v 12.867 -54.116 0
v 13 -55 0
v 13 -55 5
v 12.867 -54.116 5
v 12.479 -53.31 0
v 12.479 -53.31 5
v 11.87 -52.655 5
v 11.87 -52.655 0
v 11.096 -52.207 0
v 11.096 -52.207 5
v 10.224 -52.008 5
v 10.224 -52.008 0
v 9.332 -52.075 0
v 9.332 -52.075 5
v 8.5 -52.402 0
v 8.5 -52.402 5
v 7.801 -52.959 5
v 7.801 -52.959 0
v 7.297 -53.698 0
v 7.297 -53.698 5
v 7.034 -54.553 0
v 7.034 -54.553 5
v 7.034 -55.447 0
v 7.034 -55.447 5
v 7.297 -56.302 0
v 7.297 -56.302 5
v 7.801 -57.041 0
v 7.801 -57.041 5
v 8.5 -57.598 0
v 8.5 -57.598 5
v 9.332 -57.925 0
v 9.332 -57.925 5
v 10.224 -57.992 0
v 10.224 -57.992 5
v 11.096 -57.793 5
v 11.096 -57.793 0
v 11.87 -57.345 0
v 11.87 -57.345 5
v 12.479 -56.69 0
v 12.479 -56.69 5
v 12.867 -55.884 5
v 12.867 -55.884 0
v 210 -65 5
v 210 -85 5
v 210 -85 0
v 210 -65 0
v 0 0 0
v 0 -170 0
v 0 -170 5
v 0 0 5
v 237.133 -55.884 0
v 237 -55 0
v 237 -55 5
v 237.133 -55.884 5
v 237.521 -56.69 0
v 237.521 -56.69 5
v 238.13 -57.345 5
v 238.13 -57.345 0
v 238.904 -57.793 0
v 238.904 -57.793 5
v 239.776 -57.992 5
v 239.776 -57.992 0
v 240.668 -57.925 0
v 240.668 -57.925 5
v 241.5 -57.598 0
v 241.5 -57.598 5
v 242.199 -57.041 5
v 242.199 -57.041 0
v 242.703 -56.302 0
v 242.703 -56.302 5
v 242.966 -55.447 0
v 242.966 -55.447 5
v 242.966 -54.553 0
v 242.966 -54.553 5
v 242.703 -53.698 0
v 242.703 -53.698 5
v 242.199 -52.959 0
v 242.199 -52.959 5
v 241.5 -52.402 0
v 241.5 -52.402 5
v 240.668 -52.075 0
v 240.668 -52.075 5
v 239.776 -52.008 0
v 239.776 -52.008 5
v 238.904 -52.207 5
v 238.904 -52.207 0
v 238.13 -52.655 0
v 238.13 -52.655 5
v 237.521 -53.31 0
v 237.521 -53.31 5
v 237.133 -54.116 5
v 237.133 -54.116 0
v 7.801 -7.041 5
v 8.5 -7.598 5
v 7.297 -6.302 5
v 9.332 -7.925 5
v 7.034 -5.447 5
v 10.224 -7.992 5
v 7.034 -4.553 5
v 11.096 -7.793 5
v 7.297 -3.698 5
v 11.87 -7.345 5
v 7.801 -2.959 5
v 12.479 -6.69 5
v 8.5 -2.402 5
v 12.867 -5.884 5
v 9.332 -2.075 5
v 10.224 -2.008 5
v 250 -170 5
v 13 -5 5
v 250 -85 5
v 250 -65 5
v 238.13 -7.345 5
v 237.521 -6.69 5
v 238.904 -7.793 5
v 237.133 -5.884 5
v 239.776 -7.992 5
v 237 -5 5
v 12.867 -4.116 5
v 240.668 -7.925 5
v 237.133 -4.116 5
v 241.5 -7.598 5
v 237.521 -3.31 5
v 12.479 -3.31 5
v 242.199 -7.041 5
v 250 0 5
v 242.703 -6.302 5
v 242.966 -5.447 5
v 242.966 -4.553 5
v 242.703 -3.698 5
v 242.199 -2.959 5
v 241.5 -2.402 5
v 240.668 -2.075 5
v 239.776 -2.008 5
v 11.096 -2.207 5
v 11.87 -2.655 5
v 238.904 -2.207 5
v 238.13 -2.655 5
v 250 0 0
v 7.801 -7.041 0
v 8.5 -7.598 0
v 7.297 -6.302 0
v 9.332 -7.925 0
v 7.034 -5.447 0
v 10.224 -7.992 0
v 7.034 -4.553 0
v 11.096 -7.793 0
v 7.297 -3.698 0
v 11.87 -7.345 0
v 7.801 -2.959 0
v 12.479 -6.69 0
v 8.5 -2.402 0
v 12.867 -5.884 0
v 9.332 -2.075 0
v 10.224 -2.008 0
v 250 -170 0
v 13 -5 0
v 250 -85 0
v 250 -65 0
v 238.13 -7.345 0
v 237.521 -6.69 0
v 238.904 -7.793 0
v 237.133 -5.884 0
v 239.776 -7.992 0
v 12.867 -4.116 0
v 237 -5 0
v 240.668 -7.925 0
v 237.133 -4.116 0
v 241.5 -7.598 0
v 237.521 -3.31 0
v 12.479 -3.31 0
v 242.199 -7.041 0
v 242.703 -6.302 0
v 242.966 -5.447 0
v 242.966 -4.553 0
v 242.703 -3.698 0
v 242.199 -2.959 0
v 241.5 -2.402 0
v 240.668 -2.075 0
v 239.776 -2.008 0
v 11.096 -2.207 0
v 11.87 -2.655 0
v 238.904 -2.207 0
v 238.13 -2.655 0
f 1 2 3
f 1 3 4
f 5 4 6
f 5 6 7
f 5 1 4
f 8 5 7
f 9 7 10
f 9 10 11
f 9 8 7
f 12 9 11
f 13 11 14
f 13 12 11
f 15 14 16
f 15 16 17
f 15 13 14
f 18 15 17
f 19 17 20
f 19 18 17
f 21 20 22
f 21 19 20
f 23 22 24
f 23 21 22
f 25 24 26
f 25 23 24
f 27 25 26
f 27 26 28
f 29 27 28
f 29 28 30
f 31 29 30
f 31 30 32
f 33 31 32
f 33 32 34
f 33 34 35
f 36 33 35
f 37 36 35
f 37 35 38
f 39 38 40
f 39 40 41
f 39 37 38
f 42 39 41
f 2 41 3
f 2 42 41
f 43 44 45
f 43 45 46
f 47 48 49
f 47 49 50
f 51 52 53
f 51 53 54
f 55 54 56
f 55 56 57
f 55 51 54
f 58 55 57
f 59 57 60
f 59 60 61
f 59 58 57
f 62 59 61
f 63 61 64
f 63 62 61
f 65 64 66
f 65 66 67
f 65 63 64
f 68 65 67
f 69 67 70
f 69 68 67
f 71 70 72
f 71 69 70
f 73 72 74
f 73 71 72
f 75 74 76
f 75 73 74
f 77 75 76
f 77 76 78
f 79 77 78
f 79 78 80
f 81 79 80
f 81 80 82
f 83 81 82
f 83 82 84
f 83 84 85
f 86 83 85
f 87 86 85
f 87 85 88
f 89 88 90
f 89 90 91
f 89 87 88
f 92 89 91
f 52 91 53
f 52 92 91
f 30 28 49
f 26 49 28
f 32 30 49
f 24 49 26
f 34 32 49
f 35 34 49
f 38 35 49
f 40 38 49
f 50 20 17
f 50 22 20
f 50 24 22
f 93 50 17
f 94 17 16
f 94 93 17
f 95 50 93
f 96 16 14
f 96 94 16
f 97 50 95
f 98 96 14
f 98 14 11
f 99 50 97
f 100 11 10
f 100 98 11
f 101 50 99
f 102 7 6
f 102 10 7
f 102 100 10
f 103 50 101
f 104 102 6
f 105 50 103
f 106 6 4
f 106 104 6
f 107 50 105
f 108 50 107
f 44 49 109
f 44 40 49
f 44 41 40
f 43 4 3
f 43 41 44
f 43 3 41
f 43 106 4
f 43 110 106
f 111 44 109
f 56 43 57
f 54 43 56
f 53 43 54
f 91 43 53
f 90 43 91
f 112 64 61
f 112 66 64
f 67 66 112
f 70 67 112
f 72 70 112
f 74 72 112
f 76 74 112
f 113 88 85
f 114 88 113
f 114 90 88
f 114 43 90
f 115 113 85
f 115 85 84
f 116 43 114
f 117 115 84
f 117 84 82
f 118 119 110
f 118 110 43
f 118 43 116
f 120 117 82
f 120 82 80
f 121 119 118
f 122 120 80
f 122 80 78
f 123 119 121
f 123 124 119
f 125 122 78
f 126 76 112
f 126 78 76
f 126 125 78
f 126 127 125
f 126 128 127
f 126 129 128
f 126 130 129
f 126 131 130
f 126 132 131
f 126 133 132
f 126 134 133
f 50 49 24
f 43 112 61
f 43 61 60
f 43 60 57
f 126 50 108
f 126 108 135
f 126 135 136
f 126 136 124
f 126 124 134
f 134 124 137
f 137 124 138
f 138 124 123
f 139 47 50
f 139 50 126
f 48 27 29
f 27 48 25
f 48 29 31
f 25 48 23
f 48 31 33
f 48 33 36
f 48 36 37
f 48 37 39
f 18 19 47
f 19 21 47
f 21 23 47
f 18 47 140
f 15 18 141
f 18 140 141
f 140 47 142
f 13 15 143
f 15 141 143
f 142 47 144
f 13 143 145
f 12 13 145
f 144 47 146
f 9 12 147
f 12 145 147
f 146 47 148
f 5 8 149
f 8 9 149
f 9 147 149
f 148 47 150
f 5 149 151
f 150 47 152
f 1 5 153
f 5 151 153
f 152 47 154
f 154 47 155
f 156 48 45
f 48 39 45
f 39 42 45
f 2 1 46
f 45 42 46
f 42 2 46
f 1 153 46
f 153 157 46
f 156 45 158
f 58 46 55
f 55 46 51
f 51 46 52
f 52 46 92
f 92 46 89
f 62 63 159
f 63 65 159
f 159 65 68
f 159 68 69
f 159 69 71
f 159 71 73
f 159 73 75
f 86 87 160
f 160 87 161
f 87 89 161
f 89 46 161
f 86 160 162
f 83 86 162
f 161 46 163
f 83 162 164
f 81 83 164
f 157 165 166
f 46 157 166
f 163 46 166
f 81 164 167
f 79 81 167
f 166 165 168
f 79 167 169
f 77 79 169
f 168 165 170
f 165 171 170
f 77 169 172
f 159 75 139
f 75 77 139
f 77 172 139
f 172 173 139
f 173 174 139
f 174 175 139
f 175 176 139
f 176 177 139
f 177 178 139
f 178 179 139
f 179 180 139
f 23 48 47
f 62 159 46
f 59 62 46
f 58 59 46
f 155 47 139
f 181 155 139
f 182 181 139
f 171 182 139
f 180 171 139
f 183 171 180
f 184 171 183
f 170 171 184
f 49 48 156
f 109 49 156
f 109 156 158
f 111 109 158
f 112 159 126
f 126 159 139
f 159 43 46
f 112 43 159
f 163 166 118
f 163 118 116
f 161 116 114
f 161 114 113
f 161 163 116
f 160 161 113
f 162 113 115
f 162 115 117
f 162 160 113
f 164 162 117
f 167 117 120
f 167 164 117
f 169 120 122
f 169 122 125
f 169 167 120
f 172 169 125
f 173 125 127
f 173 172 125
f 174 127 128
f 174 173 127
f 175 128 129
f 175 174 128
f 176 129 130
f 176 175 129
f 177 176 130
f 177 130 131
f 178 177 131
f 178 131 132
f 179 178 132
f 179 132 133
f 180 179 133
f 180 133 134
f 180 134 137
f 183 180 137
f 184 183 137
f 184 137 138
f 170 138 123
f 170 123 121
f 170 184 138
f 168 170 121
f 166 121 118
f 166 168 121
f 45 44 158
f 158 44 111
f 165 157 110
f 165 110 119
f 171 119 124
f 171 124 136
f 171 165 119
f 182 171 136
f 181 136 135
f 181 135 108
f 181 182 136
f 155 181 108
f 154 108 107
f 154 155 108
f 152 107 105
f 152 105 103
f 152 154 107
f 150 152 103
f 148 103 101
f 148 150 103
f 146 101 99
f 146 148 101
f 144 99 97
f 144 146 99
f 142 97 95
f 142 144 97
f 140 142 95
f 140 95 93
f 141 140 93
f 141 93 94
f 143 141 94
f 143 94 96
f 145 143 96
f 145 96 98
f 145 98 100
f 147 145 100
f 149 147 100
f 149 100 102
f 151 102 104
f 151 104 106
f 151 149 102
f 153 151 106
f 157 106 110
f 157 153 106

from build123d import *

# Parameters (mm, degrees)
ESQUISSE1_W             = 250
ESQUISSE1_H             = 170
ESQUISSE1_R             = 3
BOSS_EXTRU_1_DEPTH      = 5
ESQUISSE4_W             = 40
ESQUISSE4_H             = 20
ENL_V_MAT_EXTRU_1_DEPTH = 10


with BuildPart() as part:
    # Esquisse1 → Boss.-Extru.1 (new body)
    with BuildSketch(Plane.XY):
        with Locations((125, -85)):
            Rectangle(ESQUISSE1_W, ESQUISSE1_H)
        with Locations((10, -55)):
            Circle(ESQUISSE1_R, mode=Mode.SUBTRACT)
        with Locations((10, -5)):
            Circle(ESQUISSE1_R, mode=Mode.SUBTRACT)
        with Locations(Location((240, -55, 0), (0, 0, 180))):
            Circle(ESQUISSE1_R, mode=Mode.SUBTRACT)
        with Locations(Location((240, -5, 0), (0, 0, 180))):
            Circle(ESQUISSE1_R, mode=Mode.SUBTRACT)
    extrude(amount=BOSS_EXTRU_1_DEPTH)

    # Esquisse4 → Enlèv. mat.-Extru.1 (cut)
    with BuildSketch(Plane.XY.offset(5)):
        with Locations((230, -75)):
            Rectangle(ESQUISSE4_W, ESQUISSE4_H)
    extrude(amount=-ENL_V_MAT_EXTRU_1_DEPTH, mode=Mode.SUBTRACT)


solid = part.part
